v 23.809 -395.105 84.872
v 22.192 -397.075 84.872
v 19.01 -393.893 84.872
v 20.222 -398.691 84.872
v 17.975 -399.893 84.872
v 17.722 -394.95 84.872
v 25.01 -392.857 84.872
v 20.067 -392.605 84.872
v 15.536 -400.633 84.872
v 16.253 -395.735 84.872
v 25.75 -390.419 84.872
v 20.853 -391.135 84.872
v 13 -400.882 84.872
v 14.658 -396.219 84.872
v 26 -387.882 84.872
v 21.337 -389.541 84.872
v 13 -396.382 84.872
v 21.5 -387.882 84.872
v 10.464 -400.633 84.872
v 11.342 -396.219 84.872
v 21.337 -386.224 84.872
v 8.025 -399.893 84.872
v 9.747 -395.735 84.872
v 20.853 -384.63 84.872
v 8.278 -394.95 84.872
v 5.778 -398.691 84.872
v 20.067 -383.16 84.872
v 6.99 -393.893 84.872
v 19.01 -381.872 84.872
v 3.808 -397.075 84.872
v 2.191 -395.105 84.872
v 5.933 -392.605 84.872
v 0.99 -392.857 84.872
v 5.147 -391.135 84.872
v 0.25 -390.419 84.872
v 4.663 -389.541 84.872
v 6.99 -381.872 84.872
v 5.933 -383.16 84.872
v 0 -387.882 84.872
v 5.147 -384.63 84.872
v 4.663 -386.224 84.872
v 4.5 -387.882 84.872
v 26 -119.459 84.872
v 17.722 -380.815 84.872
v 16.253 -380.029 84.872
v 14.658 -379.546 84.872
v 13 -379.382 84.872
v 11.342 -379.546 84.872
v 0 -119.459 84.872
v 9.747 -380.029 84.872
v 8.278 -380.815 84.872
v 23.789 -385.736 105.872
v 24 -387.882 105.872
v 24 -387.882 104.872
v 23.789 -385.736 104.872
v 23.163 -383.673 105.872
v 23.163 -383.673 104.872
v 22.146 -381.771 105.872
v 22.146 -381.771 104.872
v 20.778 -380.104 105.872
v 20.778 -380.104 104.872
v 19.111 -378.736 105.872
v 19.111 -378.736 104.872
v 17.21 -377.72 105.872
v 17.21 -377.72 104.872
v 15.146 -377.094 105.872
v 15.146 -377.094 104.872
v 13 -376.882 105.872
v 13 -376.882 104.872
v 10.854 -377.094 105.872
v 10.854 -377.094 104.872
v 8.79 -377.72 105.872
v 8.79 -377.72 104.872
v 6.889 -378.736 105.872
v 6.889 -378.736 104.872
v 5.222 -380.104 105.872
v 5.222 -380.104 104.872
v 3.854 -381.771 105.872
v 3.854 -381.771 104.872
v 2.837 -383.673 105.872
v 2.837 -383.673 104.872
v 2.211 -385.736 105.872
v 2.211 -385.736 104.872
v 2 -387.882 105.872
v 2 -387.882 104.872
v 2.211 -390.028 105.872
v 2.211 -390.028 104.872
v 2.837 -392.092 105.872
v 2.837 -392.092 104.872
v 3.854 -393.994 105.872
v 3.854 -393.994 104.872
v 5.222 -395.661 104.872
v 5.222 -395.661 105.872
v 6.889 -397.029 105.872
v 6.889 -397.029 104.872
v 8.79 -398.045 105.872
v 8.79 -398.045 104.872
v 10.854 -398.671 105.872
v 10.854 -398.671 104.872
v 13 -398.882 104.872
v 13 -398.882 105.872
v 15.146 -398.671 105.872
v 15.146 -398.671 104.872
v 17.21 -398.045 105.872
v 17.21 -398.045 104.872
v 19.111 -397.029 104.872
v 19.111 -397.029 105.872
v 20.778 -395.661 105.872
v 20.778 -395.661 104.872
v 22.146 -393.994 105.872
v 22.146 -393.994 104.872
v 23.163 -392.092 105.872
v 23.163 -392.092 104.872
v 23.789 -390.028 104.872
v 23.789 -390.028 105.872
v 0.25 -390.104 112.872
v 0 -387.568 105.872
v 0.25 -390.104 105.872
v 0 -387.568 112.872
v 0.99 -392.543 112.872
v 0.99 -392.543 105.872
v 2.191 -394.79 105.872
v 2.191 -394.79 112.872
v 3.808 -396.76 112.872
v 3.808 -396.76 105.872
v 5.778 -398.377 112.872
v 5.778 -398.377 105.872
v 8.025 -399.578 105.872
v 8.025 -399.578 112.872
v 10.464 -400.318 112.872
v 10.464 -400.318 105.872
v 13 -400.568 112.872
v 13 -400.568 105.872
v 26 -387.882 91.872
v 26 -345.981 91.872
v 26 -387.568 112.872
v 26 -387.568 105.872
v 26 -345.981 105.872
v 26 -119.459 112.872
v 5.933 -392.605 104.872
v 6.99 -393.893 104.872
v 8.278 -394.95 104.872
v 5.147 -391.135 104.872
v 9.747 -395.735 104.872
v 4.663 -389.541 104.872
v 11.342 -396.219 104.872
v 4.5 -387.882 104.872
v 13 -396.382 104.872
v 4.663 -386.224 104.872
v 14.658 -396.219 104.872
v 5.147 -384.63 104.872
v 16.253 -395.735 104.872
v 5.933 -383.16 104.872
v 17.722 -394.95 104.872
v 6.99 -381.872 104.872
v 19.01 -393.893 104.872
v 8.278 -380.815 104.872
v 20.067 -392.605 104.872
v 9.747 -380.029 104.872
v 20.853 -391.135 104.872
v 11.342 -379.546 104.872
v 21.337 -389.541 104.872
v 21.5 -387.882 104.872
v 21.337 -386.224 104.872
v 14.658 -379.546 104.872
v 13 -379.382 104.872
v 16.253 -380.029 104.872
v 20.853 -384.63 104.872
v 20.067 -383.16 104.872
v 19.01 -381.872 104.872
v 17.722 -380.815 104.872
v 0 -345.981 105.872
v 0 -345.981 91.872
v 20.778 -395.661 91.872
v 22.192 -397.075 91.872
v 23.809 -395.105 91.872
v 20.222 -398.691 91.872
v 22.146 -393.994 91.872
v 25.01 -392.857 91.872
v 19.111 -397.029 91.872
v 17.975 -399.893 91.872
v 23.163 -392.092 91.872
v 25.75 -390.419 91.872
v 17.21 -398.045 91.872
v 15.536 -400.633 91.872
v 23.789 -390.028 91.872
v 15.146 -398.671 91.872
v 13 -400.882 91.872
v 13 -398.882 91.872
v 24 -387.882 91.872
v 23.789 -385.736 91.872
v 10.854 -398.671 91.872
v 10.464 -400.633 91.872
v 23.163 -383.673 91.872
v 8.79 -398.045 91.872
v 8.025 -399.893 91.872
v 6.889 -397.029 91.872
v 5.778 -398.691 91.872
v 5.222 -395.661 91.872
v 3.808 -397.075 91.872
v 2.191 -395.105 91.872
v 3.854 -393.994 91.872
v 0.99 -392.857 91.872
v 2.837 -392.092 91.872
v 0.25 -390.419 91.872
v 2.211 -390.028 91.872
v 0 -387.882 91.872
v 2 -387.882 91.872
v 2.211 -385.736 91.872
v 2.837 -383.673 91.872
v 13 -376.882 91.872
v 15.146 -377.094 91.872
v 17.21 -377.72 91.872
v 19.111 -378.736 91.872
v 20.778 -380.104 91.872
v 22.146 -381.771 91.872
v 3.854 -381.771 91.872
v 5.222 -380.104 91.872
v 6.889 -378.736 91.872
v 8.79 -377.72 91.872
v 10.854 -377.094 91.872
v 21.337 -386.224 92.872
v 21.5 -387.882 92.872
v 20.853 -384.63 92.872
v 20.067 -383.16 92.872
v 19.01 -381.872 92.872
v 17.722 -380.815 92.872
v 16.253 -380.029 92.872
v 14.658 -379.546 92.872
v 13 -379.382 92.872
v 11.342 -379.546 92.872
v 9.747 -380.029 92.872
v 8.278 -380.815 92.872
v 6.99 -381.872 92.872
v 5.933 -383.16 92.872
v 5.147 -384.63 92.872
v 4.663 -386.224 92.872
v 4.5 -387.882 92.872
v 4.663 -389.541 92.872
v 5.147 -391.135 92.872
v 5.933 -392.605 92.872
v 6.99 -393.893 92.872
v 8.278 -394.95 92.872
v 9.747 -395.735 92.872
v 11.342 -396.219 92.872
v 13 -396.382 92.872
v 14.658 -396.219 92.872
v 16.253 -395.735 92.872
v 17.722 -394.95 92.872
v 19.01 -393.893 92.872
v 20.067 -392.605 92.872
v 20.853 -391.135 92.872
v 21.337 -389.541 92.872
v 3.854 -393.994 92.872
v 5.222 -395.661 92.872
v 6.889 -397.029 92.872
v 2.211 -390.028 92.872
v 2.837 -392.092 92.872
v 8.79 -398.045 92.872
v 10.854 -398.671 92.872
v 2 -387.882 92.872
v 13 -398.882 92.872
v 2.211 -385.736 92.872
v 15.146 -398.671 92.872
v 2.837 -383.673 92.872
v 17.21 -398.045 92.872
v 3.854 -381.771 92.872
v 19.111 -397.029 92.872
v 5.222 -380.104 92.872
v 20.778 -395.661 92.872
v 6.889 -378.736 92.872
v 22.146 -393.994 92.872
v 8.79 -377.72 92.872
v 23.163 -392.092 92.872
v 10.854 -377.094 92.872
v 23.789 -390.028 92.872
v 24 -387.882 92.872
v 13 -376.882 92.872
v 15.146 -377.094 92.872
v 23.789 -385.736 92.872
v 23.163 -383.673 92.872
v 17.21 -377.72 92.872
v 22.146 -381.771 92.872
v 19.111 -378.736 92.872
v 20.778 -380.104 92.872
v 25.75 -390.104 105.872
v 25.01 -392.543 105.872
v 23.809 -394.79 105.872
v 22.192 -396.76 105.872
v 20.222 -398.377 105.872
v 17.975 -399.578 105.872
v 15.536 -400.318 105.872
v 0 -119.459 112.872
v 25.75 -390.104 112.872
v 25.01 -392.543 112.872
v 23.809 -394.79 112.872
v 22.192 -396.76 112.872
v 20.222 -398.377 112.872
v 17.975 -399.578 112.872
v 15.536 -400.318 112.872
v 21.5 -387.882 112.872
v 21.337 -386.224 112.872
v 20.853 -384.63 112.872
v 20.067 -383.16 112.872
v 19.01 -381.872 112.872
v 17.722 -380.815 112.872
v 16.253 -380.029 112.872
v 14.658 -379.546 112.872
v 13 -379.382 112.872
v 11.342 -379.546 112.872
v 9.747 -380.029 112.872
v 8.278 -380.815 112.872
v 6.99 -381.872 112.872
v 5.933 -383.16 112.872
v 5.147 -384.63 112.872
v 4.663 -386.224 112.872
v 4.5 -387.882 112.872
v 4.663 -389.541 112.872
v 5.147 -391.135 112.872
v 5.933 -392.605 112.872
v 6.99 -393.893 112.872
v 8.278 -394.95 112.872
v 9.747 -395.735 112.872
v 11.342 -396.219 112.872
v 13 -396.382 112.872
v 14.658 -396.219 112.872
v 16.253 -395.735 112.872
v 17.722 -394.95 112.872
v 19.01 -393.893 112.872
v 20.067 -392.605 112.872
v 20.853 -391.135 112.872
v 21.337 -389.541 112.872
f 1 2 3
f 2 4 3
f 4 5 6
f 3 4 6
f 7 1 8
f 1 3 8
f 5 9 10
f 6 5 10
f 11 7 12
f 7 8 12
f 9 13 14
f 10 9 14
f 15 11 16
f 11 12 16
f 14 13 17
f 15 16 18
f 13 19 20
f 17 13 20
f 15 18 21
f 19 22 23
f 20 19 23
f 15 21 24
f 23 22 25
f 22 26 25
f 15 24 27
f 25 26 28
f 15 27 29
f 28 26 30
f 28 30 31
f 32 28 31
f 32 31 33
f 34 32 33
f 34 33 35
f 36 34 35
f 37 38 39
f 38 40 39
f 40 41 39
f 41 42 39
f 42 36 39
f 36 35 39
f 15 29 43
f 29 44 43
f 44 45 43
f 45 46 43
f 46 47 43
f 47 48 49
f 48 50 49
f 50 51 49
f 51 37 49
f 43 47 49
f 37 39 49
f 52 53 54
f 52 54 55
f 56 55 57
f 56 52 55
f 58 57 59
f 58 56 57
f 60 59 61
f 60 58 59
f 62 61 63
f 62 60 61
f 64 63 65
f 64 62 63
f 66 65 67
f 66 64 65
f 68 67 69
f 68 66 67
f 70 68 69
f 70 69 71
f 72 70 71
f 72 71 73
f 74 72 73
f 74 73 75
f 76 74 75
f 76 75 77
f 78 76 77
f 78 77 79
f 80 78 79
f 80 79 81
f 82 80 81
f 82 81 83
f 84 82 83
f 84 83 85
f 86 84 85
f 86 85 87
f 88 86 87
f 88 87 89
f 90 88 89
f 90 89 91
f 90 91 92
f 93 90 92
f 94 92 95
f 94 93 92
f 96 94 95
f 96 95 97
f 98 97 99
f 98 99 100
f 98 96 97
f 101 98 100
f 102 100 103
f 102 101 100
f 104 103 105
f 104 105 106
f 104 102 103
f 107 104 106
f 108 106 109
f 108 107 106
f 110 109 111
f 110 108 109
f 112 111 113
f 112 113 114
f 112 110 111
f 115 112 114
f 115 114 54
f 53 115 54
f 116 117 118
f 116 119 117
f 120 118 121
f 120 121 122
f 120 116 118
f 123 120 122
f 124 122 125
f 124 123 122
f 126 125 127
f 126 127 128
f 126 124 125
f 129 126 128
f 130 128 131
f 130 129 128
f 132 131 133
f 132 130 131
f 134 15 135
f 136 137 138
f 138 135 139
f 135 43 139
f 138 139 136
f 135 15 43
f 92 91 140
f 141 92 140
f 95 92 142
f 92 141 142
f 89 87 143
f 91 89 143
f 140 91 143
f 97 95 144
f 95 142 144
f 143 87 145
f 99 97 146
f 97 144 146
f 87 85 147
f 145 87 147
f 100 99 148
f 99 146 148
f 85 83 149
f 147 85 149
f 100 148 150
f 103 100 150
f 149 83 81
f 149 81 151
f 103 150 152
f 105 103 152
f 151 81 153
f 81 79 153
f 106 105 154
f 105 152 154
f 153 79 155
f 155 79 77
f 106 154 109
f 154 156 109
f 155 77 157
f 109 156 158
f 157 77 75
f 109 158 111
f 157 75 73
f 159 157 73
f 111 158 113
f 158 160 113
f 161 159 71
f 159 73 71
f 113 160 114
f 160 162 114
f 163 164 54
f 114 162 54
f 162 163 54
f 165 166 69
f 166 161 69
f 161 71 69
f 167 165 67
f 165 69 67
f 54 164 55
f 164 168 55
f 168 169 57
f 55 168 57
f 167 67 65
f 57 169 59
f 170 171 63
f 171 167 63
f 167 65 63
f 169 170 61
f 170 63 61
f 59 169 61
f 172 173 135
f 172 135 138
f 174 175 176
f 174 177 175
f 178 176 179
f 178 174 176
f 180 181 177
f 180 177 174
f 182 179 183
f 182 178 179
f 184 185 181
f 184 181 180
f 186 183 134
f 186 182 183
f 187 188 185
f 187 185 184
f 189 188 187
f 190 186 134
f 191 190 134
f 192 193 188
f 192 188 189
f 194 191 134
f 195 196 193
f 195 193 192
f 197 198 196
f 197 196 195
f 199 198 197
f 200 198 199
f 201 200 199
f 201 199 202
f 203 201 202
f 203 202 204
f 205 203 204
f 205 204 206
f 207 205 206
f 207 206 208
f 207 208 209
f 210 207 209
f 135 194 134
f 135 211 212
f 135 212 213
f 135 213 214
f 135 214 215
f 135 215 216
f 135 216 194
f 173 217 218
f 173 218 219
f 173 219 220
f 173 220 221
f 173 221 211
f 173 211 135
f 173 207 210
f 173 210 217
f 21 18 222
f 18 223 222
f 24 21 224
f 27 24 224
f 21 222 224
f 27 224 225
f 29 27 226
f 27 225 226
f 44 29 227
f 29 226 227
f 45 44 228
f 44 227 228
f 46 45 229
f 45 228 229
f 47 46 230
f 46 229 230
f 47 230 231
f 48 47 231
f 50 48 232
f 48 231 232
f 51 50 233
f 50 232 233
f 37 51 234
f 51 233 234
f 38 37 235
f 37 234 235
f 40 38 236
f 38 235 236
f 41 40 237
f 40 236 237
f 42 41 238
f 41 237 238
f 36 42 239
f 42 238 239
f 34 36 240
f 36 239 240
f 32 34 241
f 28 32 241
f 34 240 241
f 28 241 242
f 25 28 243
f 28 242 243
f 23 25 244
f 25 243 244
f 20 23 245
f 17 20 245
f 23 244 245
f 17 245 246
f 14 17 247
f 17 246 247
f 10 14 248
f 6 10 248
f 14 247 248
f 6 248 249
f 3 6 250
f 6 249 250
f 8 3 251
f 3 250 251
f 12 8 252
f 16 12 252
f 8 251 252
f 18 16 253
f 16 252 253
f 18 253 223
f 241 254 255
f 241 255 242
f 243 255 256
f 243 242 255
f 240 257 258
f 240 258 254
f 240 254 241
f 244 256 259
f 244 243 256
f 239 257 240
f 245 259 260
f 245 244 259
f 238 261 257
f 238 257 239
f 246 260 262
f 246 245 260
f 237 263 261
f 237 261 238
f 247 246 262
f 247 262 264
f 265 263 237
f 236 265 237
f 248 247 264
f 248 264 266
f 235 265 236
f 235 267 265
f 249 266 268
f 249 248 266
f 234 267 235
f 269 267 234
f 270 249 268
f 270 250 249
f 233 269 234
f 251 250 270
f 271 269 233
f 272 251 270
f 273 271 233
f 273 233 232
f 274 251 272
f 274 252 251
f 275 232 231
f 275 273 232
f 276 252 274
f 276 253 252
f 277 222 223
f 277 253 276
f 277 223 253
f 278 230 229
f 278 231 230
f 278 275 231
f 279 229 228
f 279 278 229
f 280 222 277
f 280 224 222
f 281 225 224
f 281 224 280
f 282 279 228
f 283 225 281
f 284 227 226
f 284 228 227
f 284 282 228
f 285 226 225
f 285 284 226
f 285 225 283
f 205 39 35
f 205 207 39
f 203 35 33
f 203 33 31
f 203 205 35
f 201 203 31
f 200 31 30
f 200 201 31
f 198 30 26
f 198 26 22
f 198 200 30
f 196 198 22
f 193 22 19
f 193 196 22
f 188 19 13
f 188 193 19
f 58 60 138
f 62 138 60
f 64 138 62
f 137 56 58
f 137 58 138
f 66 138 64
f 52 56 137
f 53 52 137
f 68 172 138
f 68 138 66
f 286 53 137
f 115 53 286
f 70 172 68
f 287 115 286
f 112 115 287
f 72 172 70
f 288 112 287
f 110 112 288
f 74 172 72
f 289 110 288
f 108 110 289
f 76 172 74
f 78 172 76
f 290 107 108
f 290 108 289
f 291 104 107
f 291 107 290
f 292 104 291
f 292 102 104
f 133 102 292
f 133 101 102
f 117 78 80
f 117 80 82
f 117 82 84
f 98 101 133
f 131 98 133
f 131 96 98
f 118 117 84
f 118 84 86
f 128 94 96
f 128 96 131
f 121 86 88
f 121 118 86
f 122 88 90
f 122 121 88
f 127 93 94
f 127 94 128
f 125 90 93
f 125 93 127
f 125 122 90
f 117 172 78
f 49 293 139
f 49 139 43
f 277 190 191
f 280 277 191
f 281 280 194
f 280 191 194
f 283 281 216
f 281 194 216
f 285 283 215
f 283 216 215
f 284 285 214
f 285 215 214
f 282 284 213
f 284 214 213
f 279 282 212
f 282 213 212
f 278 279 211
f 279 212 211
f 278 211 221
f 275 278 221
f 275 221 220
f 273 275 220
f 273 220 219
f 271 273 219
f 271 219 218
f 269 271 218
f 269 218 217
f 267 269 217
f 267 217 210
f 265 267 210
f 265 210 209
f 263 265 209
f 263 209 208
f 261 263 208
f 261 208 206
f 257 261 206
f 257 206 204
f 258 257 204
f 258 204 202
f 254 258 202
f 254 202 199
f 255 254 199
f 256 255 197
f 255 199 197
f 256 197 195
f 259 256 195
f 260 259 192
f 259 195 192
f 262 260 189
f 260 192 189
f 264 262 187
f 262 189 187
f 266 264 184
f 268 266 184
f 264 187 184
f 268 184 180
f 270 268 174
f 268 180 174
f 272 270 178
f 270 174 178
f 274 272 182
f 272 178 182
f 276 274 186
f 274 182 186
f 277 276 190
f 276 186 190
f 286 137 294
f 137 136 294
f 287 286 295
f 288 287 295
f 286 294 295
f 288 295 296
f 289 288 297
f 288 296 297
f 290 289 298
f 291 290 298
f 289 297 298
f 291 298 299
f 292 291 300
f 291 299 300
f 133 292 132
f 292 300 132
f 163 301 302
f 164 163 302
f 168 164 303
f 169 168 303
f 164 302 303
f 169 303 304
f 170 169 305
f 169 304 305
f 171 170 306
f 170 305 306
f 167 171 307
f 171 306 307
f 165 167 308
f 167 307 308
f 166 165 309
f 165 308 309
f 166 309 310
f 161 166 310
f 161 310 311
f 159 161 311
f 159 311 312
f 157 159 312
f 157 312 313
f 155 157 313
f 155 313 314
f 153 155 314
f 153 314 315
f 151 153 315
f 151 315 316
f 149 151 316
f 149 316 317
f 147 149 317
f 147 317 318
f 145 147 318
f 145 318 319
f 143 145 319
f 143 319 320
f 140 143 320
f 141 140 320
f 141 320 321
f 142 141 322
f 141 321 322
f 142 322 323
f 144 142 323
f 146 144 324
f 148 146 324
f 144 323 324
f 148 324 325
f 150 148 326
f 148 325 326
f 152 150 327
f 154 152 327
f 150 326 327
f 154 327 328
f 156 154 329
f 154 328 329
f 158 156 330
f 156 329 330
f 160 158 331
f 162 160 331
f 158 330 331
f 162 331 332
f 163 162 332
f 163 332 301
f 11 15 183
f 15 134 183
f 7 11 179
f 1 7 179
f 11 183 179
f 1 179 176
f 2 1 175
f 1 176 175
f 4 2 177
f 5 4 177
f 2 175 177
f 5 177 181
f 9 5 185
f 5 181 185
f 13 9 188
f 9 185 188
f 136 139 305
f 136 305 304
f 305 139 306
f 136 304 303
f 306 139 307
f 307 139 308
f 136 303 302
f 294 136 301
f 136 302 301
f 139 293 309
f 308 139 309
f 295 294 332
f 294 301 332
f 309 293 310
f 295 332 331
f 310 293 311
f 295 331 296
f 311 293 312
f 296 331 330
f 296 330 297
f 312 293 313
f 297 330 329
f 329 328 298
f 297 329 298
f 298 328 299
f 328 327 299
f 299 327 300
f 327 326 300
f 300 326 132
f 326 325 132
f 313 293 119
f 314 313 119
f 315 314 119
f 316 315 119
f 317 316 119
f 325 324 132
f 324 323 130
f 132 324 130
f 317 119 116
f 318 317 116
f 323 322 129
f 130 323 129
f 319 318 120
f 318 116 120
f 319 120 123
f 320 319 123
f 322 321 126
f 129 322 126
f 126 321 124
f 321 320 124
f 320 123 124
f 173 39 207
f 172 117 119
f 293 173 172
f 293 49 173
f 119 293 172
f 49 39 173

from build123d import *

# Parameters (mm, degrees)
BOSS_EXTRUDE1_DEPTH = 26
SKETCH4_R           = 8.5
CUT_EXTRUDE1_DEPTH  = 33
FILLET1_R           = 13
SKETCH5_R           = 11
SKETCH5_R_2         = 8.5
BOSS_EXTRUDE2_DEPTH = 8


with BuildPart() as part:
    # Sketch3 → Boss-Extrude1 (new body)
    with BuildSketch(Plane(origin=(0, 0, 0), x_dir=(0, 0, -1), z_dir=(1, 0, 0))):
        Polygon((-91.872113318, -345.981347093), (-105.872113318, -345.981347093), (-105.872113318, -400.567582276), (-112.872113318, -400.567582276), (-112.872113318, -369.669881287), (-112.872113318, -119.459461353), (-84.872113318, -119.459461353), (-84.872113318, -369.669881287), (-84.872113318, -400.882361345), (-91.872113318, -400.882361345), align=None)
    extrude(amount=BOSS_EXTRUDE1_DEPTH)

    # Sketch4 → Cut-Extrude1 (cut)
    with BuildSketch(Plane.XY.offset(112.872113318)):
        with Locations((13, -387.882361345)):
            Circle(SKETCH4_R)
    extrude(amount=-CUT_EXTRUDE1_DEPTH, mode=Mode.SUBTRACT)

    # Fillet1
    fillet1_edges = [part.edges().sort_by_distance(p)[0] for p in [
        (26, -400.567582276, 109.372113318),
        (26, -400.882361345, 88.372113318),
        (0, -400.567582276, 109.372113318),
        (0, -400.882361345, 88.372113318),
    ]]
    fillet(fillet1_edges, radius=FILLET1_R - 0.0001)  # a hair under: the kernel refuses the full size

    # Sketch5 → Boss-Extrude2 (add)
    with BuildSketch(Plane.XY.offset(112.872113318)):
        with Locations((13, -387.882361345)):
            Circle(SKETCH5_R)
        with Locations((13, -387.882361345)):
            Circle(SKETCH5_R_2, mode=Mode.SUBTRACT)
    boss_extrude2 = extrude(amount=-BOSS_EXTRUDE2_DEPTH)

    # Mirror1: Boss-Extrude2 across plane
    add(boss_extrude2.mirror(Plane.XY.offset(98.872113318)))


solid = part.part
